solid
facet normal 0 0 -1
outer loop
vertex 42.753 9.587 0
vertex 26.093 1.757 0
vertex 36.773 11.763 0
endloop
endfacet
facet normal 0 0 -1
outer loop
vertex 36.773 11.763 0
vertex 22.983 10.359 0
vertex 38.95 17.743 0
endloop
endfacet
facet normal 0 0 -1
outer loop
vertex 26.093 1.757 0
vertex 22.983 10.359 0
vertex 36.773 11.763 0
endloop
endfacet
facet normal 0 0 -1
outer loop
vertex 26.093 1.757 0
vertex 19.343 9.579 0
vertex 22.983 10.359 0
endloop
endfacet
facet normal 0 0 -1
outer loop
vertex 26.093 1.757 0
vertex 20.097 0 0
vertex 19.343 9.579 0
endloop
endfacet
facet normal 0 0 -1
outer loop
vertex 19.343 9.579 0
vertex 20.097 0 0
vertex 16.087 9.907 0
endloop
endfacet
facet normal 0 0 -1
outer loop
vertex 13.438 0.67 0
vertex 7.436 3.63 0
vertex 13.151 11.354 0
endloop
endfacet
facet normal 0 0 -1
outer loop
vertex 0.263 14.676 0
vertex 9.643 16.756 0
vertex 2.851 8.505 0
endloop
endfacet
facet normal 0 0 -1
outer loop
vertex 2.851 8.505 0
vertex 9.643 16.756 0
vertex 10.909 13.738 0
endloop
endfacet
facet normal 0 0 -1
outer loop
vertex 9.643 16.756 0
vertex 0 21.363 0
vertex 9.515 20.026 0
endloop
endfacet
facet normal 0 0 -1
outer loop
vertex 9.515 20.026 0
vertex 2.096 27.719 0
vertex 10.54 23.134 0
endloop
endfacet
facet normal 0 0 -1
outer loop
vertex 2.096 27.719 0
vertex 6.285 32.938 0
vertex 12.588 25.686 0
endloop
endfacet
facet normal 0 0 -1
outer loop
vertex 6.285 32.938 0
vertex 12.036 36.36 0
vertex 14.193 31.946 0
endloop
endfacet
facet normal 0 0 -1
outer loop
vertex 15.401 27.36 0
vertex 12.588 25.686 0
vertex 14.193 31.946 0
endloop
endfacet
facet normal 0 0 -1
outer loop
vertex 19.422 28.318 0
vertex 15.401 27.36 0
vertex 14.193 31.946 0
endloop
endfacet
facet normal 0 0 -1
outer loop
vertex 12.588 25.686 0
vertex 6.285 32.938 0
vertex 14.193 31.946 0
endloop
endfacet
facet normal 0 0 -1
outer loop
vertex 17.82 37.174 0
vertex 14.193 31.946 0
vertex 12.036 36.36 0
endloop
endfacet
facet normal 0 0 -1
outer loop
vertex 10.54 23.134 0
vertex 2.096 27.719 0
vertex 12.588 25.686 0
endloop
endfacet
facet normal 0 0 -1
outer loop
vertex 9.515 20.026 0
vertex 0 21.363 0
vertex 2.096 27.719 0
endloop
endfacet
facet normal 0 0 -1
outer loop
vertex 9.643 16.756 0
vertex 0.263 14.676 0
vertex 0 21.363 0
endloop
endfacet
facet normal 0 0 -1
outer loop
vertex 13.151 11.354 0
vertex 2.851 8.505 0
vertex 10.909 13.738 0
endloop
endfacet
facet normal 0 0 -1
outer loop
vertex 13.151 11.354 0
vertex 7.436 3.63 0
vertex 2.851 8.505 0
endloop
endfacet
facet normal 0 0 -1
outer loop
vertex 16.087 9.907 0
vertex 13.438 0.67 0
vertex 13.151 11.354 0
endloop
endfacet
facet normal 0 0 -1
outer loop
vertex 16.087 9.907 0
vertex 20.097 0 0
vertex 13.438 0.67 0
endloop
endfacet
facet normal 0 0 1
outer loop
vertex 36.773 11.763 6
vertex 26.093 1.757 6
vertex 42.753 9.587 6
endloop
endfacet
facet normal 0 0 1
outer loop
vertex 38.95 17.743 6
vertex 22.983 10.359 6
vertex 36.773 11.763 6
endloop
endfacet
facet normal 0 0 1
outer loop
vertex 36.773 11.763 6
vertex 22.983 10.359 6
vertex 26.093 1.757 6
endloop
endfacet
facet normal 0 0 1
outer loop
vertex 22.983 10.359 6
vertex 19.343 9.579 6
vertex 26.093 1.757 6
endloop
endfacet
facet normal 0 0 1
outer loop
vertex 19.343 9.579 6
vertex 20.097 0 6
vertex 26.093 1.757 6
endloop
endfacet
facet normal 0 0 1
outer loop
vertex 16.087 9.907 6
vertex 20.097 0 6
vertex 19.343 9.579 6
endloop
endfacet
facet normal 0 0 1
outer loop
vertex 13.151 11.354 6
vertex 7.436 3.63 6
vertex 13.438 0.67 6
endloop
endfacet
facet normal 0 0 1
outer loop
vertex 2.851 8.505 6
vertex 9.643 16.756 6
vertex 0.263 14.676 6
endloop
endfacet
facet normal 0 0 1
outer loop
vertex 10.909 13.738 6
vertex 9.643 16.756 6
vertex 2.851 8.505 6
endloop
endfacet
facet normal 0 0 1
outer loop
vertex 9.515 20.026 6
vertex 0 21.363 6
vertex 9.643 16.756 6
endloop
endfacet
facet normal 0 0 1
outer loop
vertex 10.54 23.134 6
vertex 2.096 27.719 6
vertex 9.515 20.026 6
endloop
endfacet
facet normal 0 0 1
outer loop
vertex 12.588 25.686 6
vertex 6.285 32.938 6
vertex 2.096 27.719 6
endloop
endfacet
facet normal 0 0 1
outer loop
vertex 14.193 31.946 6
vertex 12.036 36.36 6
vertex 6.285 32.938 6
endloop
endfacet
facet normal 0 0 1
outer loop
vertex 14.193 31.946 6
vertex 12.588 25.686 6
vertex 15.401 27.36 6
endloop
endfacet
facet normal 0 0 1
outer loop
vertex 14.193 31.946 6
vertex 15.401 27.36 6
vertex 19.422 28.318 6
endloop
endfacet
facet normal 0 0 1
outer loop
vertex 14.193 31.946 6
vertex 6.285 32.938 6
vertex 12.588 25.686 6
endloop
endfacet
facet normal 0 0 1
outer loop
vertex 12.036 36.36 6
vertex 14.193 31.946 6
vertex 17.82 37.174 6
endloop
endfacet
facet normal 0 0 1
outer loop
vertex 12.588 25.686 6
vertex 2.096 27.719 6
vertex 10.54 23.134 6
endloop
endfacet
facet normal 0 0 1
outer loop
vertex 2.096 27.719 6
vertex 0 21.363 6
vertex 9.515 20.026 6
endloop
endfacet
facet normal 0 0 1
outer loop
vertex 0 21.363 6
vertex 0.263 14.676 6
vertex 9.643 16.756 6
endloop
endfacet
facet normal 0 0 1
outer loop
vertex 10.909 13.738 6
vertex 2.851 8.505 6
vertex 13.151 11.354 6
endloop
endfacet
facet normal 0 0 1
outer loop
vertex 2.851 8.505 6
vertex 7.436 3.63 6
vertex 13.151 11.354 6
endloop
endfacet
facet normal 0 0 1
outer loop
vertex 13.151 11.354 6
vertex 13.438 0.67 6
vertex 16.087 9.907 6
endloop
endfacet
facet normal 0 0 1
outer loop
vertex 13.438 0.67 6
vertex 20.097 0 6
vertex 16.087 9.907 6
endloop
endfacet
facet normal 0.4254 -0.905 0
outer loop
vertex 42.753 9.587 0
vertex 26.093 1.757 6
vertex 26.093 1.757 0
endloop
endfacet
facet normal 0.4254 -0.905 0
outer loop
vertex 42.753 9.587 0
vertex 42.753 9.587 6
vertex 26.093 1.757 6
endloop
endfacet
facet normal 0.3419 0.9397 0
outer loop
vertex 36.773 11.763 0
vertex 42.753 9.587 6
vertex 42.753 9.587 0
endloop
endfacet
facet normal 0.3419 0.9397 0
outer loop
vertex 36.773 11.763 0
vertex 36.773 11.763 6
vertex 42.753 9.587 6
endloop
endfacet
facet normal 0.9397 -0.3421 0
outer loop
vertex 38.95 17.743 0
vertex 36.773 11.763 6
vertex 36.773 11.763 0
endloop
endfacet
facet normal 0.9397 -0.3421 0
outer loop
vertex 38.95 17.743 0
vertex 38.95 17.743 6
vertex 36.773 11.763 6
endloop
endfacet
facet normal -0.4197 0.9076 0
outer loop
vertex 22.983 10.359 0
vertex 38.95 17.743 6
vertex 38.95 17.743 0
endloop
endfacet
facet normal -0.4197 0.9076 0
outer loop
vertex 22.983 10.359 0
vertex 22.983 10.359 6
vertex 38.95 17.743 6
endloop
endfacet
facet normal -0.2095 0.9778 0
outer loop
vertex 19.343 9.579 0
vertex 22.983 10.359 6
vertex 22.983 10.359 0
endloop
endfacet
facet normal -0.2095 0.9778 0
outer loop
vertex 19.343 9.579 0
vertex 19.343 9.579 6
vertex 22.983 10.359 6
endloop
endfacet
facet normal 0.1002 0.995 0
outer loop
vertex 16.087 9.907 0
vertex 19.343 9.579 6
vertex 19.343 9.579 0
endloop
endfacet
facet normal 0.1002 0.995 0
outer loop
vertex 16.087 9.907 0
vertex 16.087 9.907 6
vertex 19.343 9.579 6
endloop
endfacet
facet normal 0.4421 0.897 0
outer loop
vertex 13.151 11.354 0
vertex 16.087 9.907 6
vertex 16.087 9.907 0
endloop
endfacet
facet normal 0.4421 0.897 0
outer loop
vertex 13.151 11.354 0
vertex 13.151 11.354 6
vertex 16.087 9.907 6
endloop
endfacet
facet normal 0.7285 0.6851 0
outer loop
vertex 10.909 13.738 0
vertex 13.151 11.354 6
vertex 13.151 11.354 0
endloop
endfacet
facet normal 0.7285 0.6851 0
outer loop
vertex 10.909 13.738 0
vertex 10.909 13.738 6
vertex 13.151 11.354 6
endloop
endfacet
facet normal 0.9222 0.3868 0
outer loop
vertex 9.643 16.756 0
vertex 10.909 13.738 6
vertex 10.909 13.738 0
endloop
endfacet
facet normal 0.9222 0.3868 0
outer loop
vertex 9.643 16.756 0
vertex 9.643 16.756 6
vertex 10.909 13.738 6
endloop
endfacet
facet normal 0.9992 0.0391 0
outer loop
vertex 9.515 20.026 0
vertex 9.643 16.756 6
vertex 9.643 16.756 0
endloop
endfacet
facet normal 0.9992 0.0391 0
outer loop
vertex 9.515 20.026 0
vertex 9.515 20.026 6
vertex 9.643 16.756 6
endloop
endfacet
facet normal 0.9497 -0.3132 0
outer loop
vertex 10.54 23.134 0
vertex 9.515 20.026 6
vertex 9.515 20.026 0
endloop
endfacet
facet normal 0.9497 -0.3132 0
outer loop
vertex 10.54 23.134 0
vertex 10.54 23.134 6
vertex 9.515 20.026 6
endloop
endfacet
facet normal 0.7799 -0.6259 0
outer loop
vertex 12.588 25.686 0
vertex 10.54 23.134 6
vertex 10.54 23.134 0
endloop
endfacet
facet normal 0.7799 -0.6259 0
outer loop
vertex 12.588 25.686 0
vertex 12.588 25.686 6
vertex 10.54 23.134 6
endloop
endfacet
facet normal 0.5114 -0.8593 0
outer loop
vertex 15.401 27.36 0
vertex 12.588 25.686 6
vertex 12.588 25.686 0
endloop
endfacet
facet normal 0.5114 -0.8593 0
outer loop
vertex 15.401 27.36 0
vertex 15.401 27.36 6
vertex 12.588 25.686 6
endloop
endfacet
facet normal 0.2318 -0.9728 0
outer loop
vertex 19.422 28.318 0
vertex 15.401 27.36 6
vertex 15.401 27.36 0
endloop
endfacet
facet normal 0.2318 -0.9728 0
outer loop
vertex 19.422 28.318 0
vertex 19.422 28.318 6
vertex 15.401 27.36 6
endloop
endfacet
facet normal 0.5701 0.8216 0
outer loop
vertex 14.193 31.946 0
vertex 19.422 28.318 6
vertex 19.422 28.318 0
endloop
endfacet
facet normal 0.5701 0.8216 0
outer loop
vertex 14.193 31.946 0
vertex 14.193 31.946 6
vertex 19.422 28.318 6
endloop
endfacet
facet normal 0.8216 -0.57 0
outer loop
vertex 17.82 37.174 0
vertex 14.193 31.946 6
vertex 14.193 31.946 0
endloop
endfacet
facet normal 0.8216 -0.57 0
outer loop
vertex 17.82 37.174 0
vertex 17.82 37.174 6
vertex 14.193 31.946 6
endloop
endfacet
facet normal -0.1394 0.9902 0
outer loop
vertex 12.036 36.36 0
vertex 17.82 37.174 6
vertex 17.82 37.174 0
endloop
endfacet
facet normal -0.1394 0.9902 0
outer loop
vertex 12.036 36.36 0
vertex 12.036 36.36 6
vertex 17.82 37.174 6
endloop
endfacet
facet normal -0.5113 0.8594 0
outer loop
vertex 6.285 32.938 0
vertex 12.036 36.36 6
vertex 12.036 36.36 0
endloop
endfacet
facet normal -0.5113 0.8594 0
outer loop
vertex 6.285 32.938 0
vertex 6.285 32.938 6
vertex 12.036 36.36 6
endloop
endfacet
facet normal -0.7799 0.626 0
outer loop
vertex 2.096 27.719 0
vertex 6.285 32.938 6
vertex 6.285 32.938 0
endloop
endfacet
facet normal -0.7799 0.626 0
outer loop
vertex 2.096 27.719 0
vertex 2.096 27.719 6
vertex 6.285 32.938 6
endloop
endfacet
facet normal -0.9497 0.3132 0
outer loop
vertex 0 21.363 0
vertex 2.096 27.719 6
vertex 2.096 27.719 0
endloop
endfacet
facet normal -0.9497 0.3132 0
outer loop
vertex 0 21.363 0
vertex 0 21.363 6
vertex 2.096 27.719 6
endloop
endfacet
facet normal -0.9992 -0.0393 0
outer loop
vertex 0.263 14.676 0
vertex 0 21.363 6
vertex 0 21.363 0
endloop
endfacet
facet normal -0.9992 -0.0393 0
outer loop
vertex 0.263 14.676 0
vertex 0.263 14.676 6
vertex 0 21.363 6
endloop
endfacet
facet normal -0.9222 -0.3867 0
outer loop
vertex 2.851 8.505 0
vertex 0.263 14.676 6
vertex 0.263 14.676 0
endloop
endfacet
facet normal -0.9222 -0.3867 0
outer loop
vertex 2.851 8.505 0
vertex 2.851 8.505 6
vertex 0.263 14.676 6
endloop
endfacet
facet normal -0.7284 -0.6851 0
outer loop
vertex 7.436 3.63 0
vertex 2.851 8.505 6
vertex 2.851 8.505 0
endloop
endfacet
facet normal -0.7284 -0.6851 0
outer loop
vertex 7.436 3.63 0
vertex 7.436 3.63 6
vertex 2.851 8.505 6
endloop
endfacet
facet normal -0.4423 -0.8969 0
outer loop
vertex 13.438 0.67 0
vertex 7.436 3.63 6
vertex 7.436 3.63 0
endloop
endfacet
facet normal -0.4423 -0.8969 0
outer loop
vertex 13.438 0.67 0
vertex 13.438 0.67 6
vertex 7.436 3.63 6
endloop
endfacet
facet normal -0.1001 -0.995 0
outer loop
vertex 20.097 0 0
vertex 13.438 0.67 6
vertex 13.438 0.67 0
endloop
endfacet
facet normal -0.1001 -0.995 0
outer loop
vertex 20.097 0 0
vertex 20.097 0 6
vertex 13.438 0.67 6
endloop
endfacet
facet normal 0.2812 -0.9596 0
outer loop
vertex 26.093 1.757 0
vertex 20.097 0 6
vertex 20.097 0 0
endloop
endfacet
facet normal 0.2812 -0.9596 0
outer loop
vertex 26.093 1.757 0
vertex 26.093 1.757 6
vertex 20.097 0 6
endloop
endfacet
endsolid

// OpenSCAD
$fn = 32;

// ----------------------------------------------------------------------
// Hook plate: curl radius 14 mm over 205 degrees, 9 mm thick band
// ----------------------------------------------------------------------

// --- parameters (mm) ---
profile_height = 6;       // extrusion height
profile_points = 26;      // points of the closed outline

profile = [[14.193, 31.946], [17.82, 37.174], [12.036, 36.36], [6.285, 32.938], [2.096, 27.719], [0, 21.363], [0.263, 14.676], [2.851, 8.505], [7.436, 3.63], [13.438, 0.67], [20.097, 0], [26.093, 1.757], [42.753, 9.587], [36.773, 11.763], [38.95, 17.743], [22.983, 10.359], [19.343, 9.579], [16.087, 9.907], [13.151, 11.354], [10.909, 13.738], [9.643, 16.756], [9.515, 20.026], [10.54, 23.134], [12.588, 25.686], [15.401, 27.36], [19.422, 28.318]];  // single closed polygon, 26 points, counter clockwise

// --- the one profile operation ---
linear_extrude(height = profile_height) polygon(points = profile);
